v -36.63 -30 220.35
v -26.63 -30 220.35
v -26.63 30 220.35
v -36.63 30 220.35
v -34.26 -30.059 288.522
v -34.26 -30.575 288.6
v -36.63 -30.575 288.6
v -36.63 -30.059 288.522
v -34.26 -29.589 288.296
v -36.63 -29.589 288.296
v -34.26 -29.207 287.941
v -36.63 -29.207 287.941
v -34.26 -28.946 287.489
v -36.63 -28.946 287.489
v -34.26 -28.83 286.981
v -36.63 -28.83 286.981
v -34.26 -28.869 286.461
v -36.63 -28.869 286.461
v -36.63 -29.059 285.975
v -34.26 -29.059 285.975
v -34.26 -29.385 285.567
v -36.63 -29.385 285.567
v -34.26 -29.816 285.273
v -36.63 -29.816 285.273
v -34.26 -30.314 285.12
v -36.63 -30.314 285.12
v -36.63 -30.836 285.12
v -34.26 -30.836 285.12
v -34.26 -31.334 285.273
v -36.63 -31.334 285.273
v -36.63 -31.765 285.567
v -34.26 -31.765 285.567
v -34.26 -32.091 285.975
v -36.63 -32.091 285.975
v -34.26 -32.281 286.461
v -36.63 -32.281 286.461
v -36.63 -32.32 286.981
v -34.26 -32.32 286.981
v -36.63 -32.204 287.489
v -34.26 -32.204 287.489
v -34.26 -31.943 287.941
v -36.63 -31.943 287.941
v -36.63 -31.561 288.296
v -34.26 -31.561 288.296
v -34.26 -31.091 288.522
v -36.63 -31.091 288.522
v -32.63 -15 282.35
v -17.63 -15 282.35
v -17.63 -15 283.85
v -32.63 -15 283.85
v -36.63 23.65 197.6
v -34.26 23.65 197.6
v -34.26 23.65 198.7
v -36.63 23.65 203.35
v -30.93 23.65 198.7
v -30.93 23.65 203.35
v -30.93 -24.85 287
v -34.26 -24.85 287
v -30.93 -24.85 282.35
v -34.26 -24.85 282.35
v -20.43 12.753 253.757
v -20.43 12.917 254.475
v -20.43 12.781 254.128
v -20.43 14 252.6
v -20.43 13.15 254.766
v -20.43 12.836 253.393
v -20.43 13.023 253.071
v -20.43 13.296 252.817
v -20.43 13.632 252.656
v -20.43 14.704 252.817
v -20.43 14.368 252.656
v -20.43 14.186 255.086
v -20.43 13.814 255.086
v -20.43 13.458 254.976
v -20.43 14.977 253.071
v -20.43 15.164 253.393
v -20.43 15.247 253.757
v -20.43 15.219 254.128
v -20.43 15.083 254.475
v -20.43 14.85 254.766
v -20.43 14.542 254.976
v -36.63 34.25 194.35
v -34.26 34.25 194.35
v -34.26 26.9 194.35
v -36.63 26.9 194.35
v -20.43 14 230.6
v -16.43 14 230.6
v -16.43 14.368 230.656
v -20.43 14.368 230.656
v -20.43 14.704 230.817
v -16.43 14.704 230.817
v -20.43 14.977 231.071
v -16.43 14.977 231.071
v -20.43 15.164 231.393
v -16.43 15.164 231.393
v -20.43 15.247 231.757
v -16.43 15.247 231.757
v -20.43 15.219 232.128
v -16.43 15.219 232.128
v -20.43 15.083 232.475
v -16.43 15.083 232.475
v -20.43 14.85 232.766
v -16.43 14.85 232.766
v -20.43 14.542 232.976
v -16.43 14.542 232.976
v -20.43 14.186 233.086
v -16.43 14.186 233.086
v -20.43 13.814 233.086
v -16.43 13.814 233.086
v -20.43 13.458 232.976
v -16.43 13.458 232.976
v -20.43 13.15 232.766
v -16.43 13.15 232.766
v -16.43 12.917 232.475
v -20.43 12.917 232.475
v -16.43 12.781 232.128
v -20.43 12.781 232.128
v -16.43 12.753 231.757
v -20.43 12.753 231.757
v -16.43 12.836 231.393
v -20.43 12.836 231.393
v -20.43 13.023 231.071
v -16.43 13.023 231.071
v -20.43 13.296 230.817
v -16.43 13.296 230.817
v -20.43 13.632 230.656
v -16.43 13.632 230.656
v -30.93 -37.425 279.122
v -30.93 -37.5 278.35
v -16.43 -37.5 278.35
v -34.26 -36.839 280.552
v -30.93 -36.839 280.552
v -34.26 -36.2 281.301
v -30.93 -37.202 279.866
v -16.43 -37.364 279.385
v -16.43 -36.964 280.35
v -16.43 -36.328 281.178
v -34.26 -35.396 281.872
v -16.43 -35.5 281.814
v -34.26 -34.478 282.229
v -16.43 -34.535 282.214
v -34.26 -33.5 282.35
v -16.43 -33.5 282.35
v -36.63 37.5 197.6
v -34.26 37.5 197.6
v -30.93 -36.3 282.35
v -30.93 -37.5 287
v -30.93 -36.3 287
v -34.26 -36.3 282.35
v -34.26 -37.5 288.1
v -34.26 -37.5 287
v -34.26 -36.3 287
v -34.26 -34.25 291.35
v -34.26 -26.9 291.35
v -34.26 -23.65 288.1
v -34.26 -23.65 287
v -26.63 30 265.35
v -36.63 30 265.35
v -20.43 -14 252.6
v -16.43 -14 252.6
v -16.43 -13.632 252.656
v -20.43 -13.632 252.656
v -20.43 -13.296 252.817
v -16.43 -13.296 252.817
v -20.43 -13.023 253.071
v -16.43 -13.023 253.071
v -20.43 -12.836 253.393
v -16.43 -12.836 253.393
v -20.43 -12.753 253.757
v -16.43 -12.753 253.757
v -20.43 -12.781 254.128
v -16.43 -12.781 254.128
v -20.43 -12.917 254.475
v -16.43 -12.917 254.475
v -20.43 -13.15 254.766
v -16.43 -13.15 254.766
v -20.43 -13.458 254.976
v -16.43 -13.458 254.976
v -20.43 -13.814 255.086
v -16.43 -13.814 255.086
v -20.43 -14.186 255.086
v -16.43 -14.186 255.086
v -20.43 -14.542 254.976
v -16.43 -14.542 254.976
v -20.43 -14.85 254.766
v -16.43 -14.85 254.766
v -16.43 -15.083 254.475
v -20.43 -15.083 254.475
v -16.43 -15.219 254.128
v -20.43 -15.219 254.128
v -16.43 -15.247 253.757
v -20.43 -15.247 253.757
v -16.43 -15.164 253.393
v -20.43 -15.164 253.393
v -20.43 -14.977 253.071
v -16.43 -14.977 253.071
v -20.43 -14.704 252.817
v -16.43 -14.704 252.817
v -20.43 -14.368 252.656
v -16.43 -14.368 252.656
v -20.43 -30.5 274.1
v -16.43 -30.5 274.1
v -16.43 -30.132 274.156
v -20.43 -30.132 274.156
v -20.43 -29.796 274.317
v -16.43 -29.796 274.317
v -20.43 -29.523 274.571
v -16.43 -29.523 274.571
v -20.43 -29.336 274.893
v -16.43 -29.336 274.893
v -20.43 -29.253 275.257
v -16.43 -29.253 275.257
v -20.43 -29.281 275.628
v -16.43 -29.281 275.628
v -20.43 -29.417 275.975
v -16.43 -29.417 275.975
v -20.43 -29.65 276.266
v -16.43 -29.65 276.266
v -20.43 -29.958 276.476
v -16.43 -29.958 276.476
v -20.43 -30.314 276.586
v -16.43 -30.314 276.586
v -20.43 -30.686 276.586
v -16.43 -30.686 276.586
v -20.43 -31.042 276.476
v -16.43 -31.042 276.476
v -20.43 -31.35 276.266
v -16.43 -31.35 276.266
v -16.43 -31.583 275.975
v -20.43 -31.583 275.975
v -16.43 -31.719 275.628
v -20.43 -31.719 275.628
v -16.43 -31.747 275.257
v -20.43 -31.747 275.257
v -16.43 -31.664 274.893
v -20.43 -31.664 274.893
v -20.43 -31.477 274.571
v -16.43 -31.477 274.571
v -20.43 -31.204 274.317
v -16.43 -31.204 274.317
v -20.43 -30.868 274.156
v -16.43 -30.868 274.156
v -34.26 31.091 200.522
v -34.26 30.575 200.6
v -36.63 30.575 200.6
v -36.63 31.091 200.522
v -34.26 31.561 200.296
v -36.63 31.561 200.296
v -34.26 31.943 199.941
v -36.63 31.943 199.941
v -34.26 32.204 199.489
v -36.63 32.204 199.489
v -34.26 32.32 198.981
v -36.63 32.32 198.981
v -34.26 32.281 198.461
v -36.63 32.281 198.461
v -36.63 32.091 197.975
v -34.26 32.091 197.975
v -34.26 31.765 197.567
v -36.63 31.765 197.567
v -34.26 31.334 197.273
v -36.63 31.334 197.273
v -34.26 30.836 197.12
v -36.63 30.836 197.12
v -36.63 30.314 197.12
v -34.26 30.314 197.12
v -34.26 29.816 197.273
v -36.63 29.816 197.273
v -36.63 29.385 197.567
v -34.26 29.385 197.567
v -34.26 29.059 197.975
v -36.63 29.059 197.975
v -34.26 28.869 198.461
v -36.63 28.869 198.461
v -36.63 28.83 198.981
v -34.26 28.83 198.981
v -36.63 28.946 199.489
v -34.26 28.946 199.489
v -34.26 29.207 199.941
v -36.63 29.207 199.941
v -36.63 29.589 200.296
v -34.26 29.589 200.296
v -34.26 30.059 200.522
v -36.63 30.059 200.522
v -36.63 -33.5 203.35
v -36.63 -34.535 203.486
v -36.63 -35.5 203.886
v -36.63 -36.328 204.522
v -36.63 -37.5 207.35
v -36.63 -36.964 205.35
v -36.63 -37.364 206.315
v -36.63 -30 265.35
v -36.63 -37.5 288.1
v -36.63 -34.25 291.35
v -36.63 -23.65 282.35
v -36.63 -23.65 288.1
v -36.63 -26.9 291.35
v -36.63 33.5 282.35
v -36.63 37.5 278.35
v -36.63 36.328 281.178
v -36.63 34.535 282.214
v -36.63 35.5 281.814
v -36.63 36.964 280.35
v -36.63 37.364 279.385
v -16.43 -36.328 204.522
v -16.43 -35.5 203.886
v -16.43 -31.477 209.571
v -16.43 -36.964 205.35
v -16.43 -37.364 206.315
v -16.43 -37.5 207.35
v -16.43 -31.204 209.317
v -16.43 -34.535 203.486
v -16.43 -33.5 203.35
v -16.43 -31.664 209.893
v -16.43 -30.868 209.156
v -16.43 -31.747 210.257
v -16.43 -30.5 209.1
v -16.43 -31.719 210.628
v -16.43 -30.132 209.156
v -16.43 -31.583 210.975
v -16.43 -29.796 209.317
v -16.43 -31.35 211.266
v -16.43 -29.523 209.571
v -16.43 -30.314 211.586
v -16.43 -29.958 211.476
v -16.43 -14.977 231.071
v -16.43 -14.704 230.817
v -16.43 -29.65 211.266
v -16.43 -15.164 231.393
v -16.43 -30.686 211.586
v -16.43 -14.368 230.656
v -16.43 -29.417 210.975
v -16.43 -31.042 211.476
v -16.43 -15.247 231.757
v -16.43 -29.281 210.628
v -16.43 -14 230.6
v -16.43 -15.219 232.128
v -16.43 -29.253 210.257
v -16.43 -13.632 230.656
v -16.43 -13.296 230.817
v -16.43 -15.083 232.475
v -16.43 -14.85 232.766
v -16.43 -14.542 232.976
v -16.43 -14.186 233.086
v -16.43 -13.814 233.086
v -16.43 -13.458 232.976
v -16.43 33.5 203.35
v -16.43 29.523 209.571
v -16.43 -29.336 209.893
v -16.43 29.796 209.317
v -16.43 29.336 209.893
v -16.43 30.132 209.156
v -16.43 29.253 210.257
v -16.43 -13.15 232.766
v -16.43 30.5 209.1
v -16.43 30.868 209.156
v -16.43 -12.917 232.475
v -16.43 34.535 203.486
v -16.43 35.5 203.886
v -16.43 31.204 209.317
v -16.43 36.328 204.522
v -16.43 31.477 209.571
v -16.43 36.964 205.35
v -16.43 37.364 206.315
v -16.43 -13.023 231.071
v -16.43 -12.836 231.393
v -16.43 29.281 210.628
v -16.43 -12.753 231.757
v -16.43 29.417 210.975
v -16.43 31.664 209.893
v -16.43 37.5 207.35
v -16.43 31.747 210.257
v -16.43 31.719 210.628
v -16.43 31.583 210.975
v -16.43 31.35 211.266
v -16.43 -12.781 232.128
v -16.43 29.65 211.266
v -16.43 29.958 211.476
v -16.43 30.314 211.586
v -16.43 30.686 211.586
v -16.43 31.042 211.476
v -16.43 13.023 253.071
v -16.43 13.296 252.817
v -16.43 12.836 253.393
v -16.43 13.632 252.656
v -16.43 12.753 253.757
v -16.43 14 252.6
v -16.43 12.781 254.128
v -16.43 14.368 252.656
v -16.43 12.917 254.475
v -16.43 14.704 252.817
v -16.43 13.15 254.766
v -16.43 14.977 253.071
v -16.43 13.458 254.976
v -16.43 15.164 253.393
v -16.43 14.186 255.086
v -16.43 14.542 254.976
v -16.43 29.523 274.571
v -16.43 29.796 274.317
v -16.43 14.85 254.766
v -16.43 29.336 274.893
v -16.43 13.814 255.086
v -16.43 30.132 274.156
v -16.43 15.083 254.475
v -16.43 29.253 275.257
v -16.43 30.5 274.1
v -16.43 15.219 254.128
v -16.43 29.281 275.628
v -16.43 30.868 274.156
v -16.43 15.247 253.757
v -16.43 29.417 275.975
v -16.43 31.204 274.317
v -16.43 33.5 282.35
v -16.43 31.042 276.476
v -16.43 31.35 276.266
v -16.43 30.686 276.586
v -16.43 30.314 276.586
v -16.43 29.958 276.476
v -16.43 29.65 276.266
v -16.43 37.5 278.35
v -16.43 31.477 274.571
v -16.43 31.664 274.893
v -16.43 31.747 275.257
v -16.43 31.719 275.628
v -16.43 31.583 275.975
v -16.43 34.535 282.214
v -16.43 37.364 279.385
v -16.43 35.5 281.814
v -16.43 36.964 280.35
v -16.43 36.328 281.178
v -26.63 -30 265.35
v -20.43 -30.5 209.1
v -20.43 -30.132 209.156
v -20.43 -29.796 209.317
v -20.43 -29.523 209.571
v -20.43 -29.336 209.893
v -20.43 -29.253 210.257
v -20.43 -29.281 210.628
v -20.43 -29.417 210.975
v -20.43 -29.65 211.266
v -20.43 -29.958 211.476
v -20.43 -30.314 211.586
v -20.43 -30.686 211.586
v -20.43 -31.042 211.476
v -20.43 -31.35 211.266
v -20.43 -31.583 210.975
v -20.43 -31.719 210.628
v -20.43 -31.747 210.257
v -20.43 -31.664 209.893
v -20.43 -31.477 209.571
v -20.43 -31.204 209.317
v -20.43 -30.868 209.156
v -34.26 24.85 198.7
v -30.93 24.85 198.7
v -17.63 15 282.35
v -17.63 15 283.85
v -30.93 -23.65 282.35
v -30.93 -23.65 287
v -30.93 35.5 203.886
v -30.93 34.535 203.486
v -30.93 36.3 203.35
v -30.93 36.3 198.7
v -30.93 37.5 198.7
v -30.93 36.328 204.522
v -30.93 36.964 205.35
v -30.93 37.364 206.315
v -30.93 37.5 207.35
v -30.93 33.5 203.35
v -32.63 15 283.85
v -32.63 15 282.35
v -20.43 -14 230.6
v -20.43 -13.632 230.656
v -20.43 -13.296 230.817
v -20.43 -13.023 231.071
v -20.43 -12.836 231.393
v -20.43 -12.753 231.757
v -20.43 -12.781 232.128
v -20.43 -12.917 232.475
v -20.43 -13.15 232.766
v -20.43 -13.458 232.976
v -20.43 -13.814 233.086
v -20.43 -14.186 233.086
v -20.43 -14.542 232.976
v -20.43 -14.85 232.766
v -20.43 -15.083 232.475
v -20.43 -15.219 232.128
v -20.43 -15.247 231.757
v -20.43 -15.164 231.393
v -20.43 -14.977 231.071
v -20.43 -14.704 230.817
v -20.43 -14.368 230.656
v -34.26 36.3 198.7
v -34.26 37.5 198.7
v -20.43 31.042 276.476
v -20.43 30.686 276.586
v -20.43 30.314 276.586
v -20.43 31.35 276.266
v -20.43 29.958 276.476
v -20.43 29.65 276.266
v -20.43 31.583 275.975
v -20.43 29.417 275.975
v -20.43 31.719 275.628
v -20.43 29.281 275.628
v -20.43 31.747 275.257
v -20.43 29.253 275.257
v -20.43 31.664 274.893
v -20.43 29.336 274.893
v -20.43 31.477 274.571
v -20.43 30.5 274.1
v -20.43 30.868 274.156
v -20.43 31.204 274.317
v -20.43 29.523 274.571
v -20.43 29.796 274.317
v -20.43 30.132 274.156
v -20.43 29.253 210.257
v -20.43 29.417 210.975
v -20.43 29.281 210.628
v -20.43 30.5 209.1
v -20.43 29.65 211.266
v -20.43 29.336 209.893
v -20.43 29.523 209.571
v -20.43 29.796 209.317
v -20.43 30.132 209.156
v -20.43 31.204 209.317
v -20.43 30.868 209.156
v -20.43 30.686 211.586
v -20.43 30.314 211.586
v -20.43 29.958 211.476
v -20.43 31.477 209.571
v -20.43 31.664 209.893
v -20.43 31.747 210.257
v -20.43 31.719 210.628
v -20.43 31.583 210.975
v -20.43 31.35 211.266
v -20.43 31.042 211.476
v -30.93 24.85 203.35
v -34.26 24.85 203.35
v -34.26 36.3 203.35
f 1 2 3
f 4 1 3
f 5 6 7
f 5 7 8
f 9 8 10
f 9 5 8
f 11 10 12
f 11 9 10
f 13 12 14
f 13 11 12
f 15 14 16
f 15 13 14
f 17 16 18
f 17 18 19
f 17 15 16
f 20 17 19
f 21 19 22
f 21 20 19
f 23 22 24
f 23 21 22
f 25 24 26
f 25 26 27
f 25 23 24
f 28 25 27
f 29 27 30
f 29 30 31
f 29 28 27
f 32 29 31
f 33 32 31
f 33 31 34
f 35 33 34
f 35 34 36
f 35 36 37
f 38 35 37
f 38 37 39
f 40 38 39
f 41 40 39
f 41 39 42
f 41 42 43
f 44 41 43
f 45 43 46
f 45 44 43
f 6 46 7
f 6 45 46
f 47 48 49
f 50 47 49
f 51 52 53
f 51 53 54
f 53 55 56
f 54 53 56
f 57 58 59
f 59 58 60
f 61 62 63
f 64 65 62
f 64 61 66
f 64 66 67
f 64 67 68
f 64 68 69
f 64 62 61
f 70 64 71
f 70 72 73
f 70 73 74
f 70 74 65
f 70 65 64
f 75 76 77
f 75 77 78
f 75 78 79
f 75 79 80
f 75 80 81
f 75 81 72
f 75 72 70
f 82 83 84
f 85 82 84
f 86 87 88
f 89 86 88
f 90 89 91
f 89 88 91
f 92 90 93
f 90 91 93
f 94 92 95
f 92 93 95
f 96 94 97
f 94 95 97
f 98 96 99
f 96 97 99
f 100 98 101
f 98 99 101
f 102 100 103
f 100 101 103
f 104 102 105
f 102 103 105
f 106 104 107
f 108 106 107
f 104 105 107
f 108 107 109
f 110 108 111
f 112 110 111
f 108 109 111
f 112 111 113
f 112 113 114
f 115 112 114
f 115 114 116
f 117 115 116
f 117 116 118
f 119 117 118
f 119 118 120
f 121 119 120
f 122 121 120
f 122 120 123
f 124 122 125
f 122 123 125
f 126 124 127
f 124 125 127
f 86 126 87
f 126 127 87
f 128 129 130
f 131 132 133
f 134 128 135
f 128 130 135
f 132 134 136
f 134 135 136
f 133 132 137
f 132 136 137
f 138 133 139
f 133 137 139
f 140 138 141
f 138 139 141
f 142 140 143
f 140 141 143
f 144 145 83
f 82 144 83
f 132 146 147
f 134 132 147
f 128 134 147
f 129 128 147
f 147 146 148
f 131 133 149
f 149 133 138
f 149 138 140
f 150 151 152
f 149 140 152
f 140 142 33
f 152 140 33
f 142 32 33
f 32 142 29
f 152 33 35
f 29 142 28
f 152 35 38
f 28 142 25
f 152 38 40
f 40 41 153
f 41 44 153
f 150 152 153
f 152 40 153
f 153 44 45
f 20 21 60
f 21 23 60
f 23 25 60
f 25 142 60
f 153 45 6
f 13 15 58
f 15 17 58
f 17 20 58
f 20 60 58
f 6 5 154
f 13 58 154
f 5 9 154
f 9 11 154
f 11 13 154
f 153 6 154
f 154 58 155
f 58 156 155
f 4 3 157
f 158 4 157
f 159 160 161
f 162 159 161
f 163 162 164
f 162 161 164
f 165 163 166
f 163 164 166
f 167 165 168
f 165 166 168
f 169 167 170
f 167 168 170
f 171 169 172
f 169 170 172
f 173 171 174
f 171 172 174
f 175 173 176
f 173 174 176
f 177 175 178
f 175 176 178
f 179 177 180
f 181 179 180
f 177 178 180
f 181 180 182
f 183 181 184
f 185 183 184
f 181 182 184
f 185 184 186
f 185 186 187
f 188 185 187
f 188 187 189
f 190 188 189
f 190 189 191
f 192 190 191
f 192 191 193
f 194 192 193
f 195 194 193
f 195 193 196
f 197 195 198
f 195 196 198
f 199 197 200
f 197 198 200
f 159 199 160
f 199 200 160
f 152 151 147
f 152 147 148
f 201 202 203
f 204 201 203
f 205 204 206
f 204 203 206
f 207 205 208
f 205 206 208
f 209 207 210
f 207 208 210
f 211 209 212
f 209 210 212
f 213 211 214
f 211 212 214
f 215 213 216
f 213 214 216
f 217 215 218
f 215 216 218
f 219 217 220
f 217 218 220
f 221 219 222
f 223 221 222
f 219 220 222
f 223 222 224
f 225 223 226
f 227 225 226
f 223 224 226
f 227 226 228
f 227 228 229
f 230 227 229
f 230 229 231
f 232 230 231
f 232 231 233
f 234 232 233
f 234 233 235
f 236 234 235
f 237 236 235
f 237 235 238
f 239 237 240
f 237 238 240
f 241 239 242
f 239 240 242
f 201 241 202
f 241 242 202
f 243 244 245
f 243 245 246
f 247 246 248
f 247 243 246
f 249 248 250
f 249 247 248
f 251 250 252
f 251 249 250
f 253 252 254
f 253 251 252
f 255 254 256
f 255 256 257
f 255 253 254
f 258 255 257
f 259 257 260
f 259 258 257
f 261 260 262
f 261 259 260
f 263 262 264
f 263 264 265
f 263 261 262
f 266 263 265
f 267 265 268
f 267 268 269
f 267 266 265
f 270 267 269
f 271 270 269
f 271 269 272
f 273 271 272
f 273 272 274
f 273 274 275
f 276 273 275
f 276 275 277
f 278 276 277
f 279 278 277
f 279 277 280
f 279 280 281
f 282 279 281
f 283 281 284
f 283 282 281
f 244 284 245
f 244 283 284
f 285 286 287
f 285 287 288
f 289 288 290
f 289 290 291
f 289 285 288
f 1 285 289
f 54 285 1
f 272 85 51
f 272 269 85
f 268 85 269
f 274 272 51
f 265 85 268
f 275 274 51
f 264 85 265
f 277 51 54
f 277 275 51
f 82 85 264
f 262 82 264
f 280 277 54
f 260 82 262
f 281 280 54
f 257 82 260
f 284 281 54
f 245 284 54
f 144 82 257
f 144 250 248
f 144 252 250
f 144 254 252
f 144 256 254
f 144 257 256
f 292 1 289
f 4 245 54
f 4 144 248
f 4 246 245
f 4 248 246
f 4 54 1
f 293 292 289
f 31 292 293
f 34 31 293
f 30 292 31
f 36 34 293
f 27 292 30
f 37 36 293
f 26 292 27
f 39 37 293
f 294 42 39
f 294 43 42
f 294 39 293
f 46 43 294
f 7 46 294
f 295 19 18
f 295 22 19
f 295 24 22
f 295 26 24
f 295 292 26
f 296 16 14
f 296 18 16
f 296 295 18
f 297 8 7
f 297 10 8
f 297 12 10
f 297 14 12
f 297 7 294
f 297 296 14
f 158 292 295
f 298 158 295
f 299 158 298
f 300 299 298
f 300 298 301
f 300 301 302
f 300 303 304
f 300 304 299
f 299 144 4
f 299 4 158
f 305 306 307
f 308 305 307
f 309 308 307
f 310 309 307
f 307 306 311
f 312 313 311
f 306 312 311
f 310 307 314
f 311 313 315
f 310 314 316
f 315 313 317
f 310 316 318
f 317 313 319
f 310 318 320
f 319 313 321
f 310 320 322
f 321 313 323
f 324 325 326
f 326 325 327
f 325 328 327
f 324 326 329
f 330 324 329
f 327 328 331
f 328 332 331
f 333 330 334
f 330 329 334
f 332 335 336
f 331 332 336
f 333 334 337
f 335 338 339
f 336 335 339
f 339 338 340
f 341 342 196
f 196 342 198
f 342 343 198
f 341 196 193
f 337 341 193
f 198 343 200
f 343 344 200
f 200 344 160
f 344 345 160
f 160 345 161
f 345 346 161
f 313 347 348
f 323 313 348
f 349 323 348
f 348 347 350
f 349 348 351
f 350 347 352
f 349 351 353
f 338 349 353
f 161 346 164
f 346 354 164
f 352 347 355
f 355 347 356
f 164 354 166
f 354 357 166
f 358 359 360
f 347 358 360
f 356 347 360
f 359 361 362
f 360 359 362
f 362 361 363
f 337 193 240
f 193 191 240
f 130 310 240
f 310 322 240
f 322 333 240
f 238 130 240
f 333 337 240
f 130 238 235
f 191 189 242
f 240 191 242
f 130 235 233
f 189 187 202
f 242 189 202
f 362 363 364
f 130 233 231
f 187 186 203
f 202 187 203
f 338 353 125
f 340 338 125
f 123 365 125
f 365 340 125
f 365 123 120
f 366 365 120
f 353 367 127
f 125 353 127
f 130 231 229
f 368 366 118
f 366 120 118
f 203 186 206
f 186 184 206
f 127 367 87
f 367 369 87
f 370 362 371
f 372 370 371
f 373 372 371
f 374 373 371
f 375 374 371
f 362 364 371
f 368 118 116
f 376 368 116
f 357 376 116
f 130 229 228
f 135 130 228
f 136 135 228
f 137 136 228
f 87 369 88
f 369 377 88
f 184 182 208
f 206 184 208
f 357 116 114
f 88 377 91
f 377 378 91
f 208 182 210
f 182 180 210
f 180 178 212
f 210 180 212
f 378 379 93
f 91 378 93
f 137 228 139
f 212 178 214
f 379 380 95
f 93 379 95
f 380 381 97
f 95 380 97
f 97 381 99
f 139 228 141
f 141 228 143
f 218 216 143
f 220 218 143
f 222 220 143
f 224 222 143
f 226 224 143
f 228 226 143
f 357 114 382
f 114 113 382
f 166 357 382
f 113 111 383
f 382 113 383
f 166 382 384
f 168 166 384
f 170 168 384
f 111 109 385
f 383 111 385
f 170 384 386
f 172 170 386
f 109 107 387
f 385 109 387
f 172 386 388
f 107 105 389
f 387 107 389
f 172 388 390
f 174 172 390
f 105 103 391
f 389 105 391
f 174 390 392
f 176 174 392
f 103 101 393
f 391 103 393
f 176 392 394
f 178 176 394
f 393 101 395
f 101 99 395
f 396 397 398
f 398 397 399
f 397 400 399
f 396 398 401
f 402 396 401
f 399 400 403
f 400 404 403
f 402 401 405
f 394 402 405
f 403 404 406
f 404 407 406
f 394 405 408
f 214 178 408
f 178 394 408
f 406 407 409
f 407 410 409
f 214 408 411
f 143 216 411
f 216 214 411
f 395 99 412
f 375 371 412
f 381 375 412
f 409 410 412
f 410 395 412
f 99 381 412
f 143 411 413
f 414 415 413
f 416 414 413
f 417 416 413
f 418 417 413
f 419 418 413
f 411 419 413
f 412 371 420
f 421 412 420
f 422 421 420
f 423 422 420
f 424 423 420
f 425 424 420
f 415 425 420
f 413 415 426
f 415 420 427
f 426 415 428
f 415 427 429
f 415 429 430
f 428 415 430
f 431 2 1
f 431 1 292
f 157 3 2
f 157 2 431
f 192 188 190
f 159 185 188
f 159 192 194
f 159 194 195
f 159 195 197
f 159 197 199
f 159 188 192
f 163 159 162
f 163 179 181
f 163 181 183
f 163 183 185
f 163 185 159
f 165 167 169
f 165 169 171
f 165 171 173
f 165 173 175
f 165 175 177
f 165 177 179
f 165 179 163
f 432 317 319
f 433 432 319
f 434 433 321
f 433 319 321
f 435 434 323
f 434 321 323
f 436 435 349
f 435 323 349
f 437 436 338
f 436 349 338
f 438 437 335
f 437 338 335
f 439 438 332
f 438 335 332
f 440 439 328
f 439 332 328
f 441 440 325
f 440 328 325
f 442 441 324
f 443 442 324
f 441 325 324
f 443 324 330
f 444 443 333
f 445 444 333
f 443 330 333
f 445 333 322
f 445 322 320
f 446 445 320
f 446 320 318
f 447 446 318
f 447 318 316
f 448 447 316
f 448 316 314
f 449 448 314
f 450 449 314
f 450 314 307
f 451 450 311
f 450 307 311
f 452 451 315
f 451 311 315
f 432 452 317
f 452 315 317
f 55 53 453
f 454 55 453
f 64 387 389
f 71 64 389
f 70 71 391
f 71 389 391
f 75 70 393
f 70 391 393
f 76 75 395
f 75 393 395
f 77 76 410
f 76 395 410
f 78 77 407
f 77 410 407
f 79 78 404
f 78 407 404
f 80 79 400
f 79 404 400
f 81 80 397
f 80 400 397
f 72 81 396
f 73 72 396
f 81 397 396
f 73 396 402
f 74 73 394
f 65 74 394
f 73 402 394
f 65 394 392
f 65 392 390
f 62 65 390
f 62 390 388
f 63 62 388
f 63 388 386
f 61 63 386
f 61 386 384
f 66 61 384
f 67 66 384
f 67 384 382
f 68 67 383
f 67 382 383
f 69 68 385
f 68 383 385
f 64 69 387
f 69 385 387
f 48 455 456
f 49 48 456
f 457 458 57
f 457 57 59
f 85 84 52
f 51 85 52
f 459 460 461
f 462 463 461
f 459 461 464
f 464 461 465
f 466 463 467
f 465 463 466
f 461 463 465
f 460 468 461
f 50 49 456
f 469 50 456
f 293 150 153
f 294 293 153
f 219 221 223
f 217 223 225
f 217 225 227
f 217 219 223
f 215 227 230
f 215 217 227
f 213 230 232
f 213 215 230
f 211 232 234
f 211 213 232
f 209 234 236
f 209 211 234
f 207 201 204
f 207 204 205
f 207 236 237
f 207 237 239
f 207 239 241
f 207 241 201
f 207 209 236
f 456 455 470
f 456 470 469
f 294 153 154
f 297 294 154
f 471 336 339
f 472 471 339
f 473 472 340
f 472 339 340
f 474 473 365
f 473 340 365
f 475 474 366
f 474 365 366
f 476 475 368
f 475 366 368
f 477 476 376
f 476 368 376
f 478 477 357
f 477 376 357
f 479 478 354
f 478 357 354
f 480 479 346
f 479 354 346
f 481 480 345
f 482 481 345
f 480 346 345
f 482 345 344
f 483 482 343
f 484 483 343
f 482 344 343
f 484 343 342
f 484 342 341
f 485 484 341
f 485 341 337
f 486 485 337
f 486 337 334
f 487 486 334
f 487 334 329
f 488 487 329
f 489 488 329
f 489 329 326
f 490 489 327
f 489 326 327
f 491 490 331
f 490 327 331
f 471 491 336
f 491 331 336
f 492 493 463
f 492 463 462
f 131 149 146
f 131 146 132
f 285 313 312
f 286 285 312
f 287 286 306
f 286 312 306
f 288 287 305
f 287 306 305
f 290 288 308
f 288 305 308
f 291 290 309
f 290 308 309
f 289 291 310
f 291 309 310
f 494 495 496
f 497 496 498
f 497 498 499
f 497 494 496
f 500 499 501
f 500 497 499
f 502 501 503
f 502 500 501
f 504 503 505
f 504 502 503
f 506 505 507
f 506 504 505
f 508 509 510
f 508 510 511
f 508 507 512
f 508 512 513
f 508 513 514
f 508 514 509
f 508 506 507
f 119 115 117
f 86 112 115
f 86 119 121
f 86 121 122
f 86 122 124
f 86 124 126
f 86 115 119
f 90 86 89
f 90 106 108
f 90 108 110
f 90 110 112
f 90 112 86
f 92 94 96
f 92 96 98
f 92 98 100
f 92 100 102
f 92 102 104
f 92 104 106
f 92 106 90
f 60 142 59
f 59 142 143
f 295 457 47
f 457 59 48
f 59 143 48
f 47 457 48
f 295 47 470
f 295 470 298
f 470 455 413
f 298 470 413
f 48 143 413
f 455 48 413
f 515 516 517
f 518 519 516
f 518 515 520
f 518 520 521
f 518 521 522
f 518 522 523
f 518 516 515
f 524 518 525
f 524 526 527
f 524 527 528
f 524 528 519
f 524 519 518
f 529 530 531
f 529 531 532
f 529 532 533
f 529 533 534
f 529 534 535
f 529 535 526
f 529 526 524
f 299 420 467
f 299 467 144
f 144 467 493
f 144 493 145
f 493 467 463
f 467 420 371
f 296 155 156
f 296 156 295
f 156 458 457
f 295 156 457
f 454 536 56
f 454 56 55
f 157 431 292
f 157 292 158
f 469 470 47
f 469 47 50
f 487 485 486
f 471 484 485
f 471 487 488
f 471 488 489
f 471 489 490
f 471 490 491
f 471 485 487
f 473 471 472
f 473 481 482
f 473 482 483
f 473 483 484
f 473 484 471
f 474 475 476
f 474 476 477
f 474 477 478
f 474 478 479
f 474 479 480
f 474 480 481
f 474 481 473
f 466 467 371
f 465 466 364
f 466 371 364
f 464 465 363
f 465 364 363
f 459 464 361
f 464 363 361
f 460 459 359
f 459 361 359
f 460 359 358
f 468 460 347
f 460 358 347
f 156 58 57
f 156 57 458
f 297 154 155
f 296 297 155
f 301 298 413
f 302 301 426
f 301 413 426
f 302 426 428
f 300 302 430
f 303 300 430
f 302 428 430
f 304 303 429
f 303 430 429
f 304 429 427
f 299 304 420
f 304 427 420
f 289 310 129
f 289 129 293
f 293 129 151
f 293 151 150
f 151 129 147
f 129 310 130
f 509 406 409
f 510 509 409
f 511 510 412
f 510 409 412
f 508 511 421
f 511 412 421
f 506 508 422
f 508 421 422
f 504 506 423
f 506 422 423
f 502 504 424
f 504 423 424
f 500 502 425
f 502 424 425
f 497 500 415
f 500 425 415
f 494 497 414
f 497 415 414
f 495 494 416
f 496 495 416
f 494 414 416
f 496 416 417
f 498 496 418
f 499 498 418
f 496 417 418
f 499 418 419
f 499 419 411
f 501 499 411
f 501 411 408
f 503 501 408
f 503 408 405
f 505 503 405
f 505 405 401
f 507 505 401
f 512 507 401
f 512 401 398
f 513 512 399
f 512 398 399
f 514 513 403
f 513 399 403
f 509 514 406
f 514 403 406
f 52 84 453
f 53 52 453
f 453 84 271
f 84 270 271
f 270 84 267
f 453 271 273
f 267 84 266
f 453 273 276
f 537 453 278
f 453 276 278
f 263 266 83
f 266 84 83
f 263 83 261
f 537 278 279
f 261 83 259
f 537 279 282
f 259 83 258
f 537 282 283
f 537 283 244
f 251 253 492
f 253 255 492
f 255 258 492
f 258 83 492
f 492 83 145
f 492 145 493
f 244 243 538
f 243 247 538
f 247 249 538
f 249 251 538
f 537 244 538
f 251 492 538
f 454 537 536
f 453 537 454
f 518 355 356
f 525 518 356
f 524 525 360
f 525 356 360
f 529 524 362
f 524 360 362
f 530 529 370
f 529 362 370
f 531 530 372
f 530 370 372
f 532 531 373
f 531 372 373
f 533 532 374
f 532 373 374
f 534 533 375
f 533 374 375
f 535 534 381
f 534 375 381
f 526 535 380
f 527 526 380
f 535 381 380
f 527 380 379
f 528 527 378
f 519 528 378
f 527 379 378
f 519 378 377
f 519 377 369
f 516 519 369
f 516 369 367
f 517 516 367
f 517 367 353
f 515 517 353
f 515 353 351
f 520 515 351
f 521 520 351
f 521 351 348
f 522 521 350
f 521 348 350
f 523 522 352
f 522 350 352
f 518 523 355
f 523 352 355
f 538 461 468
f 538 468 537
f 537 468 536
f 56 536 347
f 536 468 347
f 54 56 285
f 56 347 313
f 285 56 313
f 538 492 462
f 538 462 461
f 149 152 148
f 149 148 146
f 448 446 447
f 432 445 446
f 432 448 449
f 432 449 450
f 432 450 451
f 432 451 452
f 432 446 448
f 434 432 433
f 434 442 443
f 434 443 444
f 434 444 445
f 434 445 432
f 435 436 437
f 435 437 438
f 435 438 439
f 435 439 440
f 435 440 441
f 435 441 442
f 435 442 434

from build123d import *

# Parameters (mm, degrees)
CUT_EXTRUDE2_START       = -5.64
CUT_EXTRUDE2_DEPTH       = 15.64
CUT_EXTRUDE2_START_2     = 10
CUT_EXTRUDE2_2_OUTLINE_W = 45
CUT_EXTRUDE2_2_OUTLINE_H = 60
CUT_EXTRUDE2_2_DEPTH     = 10
CUT_EXTRUDE2_3_OUTLINE_W = 3.75
CUT_EXTRUDE2_3_OUTLINE_H = 5.38
CUT_EXTRUDE2_3_OUTLINE_R = 2.25
CUT_EXTRUDE2_3_DEPTH     = 5.64
CUT_EXTRUDE2_START_3     = 1
CUT_EXTRUDE2_4_OUTLINE_W = 1.5
CUT_EXTRUDE2_4_OUTLINE_H = 30
CUT_EXTRUDE2_4_DEPTH     = 15
CUT_EXTRUDE2_START_4     = 17.63
CUT_EXTRUDE2_5_OUTLINE_R = 1.75
CUT_EXTRUDE2_5_DEPTH     = 2.37
CUT_EXTRUDE2_6_OUTLINE_W = 3.75
CUT_EXTRUDE2_6_OUTLINE_H = 5.38
CUT_EXTRUDE2_6_DEPTH     = 2.76
SKETCH2_3_W              = 140.737770098
SKETCH2_3_H              = 110.811519169
CUT_EXTRUDE3_DEPTH       = 304.171110926
BOSS_EXTRUDE1_START      = -2.37
SKETCH3_W                = 4.65
SKETCH3_H                = 1.2
BOSS_EXTRUDE1_DEPTH      = 5.7
BOSS_EXTRUDE2_START      = 0.2
BOSS_EXTRUDE2_DEPTH      = 0.2
SKETCH5_R                = 1.25
CUT_EXTRUDE4_DEPTH       = 4


with BuildPart() as part:
    # Cut-Extrude2: read off the stored shape, not the designer's step
    # Cut-Extrude2 outline → Cut-Extrude2 (new body)
    with BuildSketch(Plane.ZY.offset(16.63).offset(CUT_EXTRUDE2_START)):
        with BuildLine():
            Line((278.35, 37.5), (207.35, 37.5))
            ThreePointArc((207.35, 37.5), (204.521572875, 36.328427125), (203.35, 33.5))
            Line((203.35, 33.5), (203.35, -33.5))
            ThreePointArc((203.35, -33.5), (204.521572875, -36.328427125), (207.35, -37.5))
            Line((207.35, -37.5), (278.35, -37.5))
            ThreePointArc((278.35, -37.5), (281.178427125, -36.328427125), (282.35, -33.5))
            Line((282.35, -33.5), (282.35, 33.5))
            ThreePointArc((282.35, 33.5), (281.178427125, 36.328427125), (278.35, 37.5))
        make_face()
    extrude(amount=CUT_EXTRUDE2_DEPTH)

    # Cut-Extrude2 2 outline → Cut-Extrude2 2 (add)
    with BuildSketch(Plane.ZY.offset(16.63).offset(CUT_EXTRUDE2_START_2)):
        with BuildLine():
            Line((278.35, 37.5), (207.35, 37.5))
            ThreePointArc((207.35, 37.5), (204.521572875, 36.328427125), (203.35, 33.5))
            Line((203.35, 33.5), (203.35, -33.5))
            ThreePointArc((203.35, -33.5), (204.521572875, -36.328427125), (207.35, -37.5))
            Line((207.35, -37.5), (278.35, -37.5))
            ThreePointArc((278.35, -37.5), (281.178427125, -36.328427125), (282.35, -33.5))
            Line((282.35, -33.5), (282.35, 33.5))
            ThreePointArc((282.35, 33.5), (281.178427125, 36.328427125), (278.35, 37.5))
        make_face()
        with Locations((242.85, 0)):
            Rectangle(CUT_EXTRUDE2_2_OUTLINE_W, CUT_EXTRUDE2_2_OUTLINE_H, mode=Mode.SUBTRACT)
    extrude(amount=CUT_EXTRUDE2_2_DEPTH)

    # Cut-Extrude2 3 outline → Cut-Extrude2 3 (add)
    with BuildSketch(Plane.ZY.offset(16.63).offset(CUT_EXTRUDE2_START)):
        with BuildLine():
            Line((265.098595461, 50), (220.601404539, 50))
            ThreePointArc((220.601404539, 50), (219.943611025, 49.92699636), (219.317831724, 49.711538462))
            ThreePointArc((219.317831724, 49.711538462), (203.959127035, 38.890872965), (193.138461538, 23.532168276))
            ThreePointArc((193.138461538, 23.532168276), (192.973645398, 23.10099455), (192.876926999, 22.649640261))
            ThreePointArc((192.876926999, 22.649640261), (192.307463231, 21.255507449), (191.132317903, 20.313738508))
            ThreePointArc((191.132317903, 20.313738508), (189.716924685, 19.276000929), (188.85, 17.75))
            Line((188.85, 17.75), (187.489252005, 13.440964681))
            ThreePointArc((187.489252005, 13.440964681), (187.385017371, 12.994602312), (187.35, 12.537570577))
            Line((187.35, 12.537570577), (187.35, -12.537570577))
            ThreePointArc((187.35, -12.537570577), (187.385017371, -12.994602312), (187.489252005, -13.440964681))
            Line((187.489252005, -13.440964681), (188.85, -17.75))
            ThreePointArc((188.85, -17.75), (189.716924685, -19.276000929), (191.132317903, -20.313738508))
            ThreePointArc((191.132317903, -20.313738508), (192.307463231, -21.255507449), (192.876926999, -22.649640261))
            ThreePointArc((192.876926999, -22.649640261), (192.973645398, -23.10099455), (193.138461538, -23.532168276))
            ThreePointArc((193.138461538, -23.532168276), (203.959127035, -38.890872965), (219.317831724, -49.711538462))
            ThreePointArc((219.317831724, -49.711538462), (219.943611025, -49.92699636), (220.601404539, -50))
            Line((220.601404539, -50), (265.098595461, -50))
            ThreePointArc((265.098595461, -50), (265.756388975, -49.92699636), (266.382168276, -49.711538462))
            ThreePointArc((266.382168276, -49.711538462), (281.740872965, -38.890872965), (292.561538462, -23.532168276))
            ThreePointArc((292.561538462, -23.532168276), (292.726354602, -23.10099455), (292.823073001, -22.649640261))
            ThreePointArc((292.823073001, -22.649640261), (293.392536769, -21.255507449), (294.567682097, -20.313738508))
            ThreePointArc((294.567682097, -20.313738508), (295.983075315, -19.276000929), (296.85, -17.75))
            Line((296.85, -17.75), (298.210747995, -13.440964681))
            ThreePointArc((298.210747995, -13.440964681), (298.314982629, -12.994602312), (298.35, -12.537570577))
            Line((298.35, -12.537570577), (298.35, 12.537570577))
            ThreePointArc((298.35, 12.537570577), (298.314982629, 12.994602312), (298.210747995, 13.440964681))
            Line((298.210747995, 13.440964681), (296.85, 17.75))
            ThreePointArc((296.85, 17.75), (295.983075315, 19.276000929), (294.567682097, 20.313738508))
            ThreePointArc((294.567682097, 20.313738508), (293.392536769, 21.255507449), (292.823073001, 22.649640261))
            ThreePointArc((292.823073001, 22.649640261), (292.726354602, 23.10099455), (292.561538462, 23.532168276))
            ThreePointArc((292.561538462, 23.532168276), (281.740872965, 38.890872965), (266.382168276, 49.711538462))
            ThreePointArc((266.382168276, 49.711538462), (265.756388975, 49.92699636), (265.098595461, 50))
        make_face()
        with BuildLine():
            ThreePointArc((282.35, -33.5), (281.178427125, -36.328427125), (278.35, -37.5))
            Line((278.35, -37.5), (207.35, -37.5))
            ThreePointArc((207.35, -37.5), (204.521572875, -36.328427125), (203.35, -33.5))
            Line((203.35, -33.5), (203.35, 33.5))
            ThreePointArc((203.35, 33.5), (204.521572875, 36.328427125), (207.35, 37.5))
            Line((207.35, 37.5), (278.35, 37.5))
            ThreePointArc((278.35, 37.5), (281.178427125, 36.328427125), (282.35, 33.5))
            Line((282.35, 33.5), (282.35, -33.5))
        make_face(mode=Mode.SUBTRACT)
        with Locations((291.85, -15.815)):
            Rectangle(CUT_EXTRUDE2_3_OUTLINE_W, CUT_EXTRUDE2_3_OUTLINE_H, mode=Mode.SUBTRACT)
        with Locations((294.35, 0)):
            Circle(CUT_EXTRUDE2_3_OUTLINE_R, mode=Mode.SUBTRACT)
        with Locations((291.85, 15.815)):
            Rectangle(CUT_EXTRUDE2_3_OUTLINE_W, CUT_EXTRUDE2_3_OUTLINE_H, mode=Mode.SUBTRACT)
        with Locations((193.85, 15.815)):
            Rectangle(CUT_EXTRUDE2_3_OUTLINE_W, CUT_EXTRUDE2_3_OUTLINE_H, mode=Mode.SUBTRACT)
        with Locations((193.85, -15.815)):
            Rectangle(CUT_EXTRUDE2_3_OUTLINE_W, CUT_EXTRUDE2_3_OUTLINE_H, mode=Mode.SUBTRACT)
        with Locations((191.35, 0)):
            Circle(CUT_EXTRUDE2_3_OUTLINE_R, mode=Mode.SUBTRACT)
    extrude(amount=CUT_EXTRUDE2_3_DEPTH)

    # Cut-Extrude2 4 outline → Cut-Extrude2 4 (add)
    with BuildSketch(Plane.ZY.offset(16.63).offset(CUT_EXTRUDE2_START_3)):
        with Locations((283.1, 0)):
            Rectangle(CUT_EXTRUDE2_4_OUTLINE_W, CUT_EXTRUDE2_4_OUTLINE_H)
    extrude(amount=CUT_EXTRUDE2_4_DEPTH)

    # Cut-Extrude2 5 outline → Cut-Extrude2 5 (add)
    # profile 1 of 2: a face of its own
    with BuildSketch(Plane.ZY.offset(16.63).offset(CUT_EXTRUDE2_START_4)):
        with BuildLine():
            Line((194.35, 26.9), (197.6, 23.65))
            Line((197.6, 23.65), (203.35, 23.65))
            Line((203.35, 23.65), (203.35, 33.5))
            ThreePointArc((203.35, 33.5), (204.521572875, 36.328427125), (207.35, 37.5))
            Line((207.35, 37.5), (197.6, 37.5))
            Line((197.6, 37.5), (194.35, 34.25))
            Line((194.35, 34.25), (194.35, 26.9))
        make_face()
        with Locations((198.85, 30.575)):
            Circle(CUT_EXTRUDE2_5_OUTLINE_R, mode=Mode.SUBTRACT)
    # profile 2 of 2: a face of its own
    with BuildSketch(Plane.ZY.offset(16.63).offset(CUT_EXTRUDE2_START_4)):
        with BuildLine():
            Line((288.1, -23.65), (282.35, -23.65))
            Line((282.35, -23.65), (282.35, -33.5))
            ThreePointArc((282.35, -33.5), (281.178427125, -36.328427125), (278.35, -37.5))
            Line((278.35, -37.5), (288.1, -37.5))
            Line((288.1, -37.5), (291.35, -34.25))
            Line((291.35, -34.25), (291.35, -26.9))
            Line((291.35, -26.9), (288.1, -23.65))
        make_face()
        with Locations((286.85, -30.575)):
            Circle(CUT_EXTRUDE2_5_OUTLINE_R, mode=Mode.SUBTRACT)
    extrude(amount=CUT_EXTRUDE2_5_DEPTH)

    # Cut-Extrude2 6 outline → Cut-Extrude2 6 (add)
    with BuildSketch(Plane.ZY.offset(16.63).offset(CUT_EXTRUDE2_START)):
        with Locations((193.85, 15.815)):
            Rectangle(CUT_EXTRUDE2_6_OUTLINE_W, CUT_EXTRUDE2_6_OUTLINE_H)
        with Locations((193.85, -15.815)):
            Rectangle(CUT_EXTRUDE2_6_OUTLINE_W, CUT_EXTRUDE2_6_OUTLINE_H)
        with Locations((291.85, 15.815)):
            Rectangle(CUT_EXTRUDE2_6_OUTLINE_W, CUT_EXTRUDE2_6_OUTLINE_H)
        with Locations((291.85, -15.815)):
            Rectangle(CUT_EXTRUDE2_6_OUTLINE_W, CUT_EXTRUDE2_6_OUTLINE_H)
    extrude(amount=CUT_EXTRUDE2_6_DEPTH)

    # Sketch2<3> → Cut-Extrude3 (cut, through all)
    with BuildSketch(Plane.ZY.offset(16.63)):
        with Locations((257.718885049, 1.798950297)):
            Rectangle(SKETCH2_3_W, SKETCH2_3_H)
    extrude(amount=-CUT_EXTRUDE3_DEPTH, mode=Mode.SUBTRACT)

    # Sketch3 → Boss-Extrude1 (add)
    with BuildSketch(Plane(origin=(-34.26, 0, 0), x_dir=(0, 0, -1), z_dir=(1, 0, 0)).offset(BOSS_EXTRUDE1_START)):
        Polygon((-207.35, 37.5), (-198.7, 37.5), (-198.7, 36.3), (-203.35, 36.3), (-203.35, 33.5), align=None)
        with Locations((-201.025, 24.25)):
            Rectangle(SKETCH3_W, SKETCH3_H)
        Polygon((-287, -37.5), (-287, -36.3), (-282.35, -36.3), (-278.35, -37.5), align=None)
        with Locations((-284.675, -24.25)):
            Rectangle(SKETCH3_W, SKETCH3_H)
    extrude(amount=BOSS_EXTRUDE1_DEPTH)

    # Sketch4 → Boss-Extrude2 (add)
    with BuildSketch(Plane(origin=(-16.63, 0, 0), x_dir=(0, 0, -1), z_dir=(1, 0, 0)).offset(BOSS_EXTRUDE2_START)):
        with BuildLine():
            Line((-278.35, 37.5), (-207.35, 37.5))
            ThreePointArc((-207.35, 37.5), (-204.521572875, 36.328427125), (-203.35, 33.5))
            Line((-203.35, 33.5), (-203.35, -33.5))
            ThreePointArc((-203.35, -33.5), (-204.521572875, -36.328427125), (-207.35, -37.5))
            Line((-207.35, -37.5), (-278.35, -37.5))
            ThreePointArc((-278.35, -37.5), (-281.178427125, -36.328427125), (-282.35, -33.5))
            Line((-282.35, -33.5), (-282.35, 33.5))
            ThreePointArc((-282.35, 33.5), (-281.178427125, 36.328427125), (-278.35, 37.5))
        make_face()
    extrude(amount=-BOSS_EXTRUDE2_DEPTH)

    # Sketch5 → Cut-Extrude4 (cut)
    with BuildSketch(Plane(origin=(-16.43, 0, 0), x_dir=(0, 0, -1), z_dir=(1, 0, 0))):
        with Locations((-275.35, 30.5)):
            Circle(SKETCH5_R)
        with Locations((-210.35, 30.5)):
            Circle(SKETCH5_R)
        with Locations((-210.35, -30.5)):
            Circle(SKETCH5_R)
        with Locations((-275.35, -30.5)):
            Circle(SKETCH5_R)
        with Locations((-253.85, 14)):
            Circle(SKETCH5_R)
        with Locations((-231.85, 14)):
            Circle(SKETCH5_R)
        with Locations((-231.85, -14)):
            Circle(SKETCH5_R)
        with Locations((-253.85, -14)):
            Circle(SKETCH5_R)
    extrude(amount=-CUT_EXTRUDE4_DEPTH, mode=Mode.SUBTRACT)


solid = part.part
